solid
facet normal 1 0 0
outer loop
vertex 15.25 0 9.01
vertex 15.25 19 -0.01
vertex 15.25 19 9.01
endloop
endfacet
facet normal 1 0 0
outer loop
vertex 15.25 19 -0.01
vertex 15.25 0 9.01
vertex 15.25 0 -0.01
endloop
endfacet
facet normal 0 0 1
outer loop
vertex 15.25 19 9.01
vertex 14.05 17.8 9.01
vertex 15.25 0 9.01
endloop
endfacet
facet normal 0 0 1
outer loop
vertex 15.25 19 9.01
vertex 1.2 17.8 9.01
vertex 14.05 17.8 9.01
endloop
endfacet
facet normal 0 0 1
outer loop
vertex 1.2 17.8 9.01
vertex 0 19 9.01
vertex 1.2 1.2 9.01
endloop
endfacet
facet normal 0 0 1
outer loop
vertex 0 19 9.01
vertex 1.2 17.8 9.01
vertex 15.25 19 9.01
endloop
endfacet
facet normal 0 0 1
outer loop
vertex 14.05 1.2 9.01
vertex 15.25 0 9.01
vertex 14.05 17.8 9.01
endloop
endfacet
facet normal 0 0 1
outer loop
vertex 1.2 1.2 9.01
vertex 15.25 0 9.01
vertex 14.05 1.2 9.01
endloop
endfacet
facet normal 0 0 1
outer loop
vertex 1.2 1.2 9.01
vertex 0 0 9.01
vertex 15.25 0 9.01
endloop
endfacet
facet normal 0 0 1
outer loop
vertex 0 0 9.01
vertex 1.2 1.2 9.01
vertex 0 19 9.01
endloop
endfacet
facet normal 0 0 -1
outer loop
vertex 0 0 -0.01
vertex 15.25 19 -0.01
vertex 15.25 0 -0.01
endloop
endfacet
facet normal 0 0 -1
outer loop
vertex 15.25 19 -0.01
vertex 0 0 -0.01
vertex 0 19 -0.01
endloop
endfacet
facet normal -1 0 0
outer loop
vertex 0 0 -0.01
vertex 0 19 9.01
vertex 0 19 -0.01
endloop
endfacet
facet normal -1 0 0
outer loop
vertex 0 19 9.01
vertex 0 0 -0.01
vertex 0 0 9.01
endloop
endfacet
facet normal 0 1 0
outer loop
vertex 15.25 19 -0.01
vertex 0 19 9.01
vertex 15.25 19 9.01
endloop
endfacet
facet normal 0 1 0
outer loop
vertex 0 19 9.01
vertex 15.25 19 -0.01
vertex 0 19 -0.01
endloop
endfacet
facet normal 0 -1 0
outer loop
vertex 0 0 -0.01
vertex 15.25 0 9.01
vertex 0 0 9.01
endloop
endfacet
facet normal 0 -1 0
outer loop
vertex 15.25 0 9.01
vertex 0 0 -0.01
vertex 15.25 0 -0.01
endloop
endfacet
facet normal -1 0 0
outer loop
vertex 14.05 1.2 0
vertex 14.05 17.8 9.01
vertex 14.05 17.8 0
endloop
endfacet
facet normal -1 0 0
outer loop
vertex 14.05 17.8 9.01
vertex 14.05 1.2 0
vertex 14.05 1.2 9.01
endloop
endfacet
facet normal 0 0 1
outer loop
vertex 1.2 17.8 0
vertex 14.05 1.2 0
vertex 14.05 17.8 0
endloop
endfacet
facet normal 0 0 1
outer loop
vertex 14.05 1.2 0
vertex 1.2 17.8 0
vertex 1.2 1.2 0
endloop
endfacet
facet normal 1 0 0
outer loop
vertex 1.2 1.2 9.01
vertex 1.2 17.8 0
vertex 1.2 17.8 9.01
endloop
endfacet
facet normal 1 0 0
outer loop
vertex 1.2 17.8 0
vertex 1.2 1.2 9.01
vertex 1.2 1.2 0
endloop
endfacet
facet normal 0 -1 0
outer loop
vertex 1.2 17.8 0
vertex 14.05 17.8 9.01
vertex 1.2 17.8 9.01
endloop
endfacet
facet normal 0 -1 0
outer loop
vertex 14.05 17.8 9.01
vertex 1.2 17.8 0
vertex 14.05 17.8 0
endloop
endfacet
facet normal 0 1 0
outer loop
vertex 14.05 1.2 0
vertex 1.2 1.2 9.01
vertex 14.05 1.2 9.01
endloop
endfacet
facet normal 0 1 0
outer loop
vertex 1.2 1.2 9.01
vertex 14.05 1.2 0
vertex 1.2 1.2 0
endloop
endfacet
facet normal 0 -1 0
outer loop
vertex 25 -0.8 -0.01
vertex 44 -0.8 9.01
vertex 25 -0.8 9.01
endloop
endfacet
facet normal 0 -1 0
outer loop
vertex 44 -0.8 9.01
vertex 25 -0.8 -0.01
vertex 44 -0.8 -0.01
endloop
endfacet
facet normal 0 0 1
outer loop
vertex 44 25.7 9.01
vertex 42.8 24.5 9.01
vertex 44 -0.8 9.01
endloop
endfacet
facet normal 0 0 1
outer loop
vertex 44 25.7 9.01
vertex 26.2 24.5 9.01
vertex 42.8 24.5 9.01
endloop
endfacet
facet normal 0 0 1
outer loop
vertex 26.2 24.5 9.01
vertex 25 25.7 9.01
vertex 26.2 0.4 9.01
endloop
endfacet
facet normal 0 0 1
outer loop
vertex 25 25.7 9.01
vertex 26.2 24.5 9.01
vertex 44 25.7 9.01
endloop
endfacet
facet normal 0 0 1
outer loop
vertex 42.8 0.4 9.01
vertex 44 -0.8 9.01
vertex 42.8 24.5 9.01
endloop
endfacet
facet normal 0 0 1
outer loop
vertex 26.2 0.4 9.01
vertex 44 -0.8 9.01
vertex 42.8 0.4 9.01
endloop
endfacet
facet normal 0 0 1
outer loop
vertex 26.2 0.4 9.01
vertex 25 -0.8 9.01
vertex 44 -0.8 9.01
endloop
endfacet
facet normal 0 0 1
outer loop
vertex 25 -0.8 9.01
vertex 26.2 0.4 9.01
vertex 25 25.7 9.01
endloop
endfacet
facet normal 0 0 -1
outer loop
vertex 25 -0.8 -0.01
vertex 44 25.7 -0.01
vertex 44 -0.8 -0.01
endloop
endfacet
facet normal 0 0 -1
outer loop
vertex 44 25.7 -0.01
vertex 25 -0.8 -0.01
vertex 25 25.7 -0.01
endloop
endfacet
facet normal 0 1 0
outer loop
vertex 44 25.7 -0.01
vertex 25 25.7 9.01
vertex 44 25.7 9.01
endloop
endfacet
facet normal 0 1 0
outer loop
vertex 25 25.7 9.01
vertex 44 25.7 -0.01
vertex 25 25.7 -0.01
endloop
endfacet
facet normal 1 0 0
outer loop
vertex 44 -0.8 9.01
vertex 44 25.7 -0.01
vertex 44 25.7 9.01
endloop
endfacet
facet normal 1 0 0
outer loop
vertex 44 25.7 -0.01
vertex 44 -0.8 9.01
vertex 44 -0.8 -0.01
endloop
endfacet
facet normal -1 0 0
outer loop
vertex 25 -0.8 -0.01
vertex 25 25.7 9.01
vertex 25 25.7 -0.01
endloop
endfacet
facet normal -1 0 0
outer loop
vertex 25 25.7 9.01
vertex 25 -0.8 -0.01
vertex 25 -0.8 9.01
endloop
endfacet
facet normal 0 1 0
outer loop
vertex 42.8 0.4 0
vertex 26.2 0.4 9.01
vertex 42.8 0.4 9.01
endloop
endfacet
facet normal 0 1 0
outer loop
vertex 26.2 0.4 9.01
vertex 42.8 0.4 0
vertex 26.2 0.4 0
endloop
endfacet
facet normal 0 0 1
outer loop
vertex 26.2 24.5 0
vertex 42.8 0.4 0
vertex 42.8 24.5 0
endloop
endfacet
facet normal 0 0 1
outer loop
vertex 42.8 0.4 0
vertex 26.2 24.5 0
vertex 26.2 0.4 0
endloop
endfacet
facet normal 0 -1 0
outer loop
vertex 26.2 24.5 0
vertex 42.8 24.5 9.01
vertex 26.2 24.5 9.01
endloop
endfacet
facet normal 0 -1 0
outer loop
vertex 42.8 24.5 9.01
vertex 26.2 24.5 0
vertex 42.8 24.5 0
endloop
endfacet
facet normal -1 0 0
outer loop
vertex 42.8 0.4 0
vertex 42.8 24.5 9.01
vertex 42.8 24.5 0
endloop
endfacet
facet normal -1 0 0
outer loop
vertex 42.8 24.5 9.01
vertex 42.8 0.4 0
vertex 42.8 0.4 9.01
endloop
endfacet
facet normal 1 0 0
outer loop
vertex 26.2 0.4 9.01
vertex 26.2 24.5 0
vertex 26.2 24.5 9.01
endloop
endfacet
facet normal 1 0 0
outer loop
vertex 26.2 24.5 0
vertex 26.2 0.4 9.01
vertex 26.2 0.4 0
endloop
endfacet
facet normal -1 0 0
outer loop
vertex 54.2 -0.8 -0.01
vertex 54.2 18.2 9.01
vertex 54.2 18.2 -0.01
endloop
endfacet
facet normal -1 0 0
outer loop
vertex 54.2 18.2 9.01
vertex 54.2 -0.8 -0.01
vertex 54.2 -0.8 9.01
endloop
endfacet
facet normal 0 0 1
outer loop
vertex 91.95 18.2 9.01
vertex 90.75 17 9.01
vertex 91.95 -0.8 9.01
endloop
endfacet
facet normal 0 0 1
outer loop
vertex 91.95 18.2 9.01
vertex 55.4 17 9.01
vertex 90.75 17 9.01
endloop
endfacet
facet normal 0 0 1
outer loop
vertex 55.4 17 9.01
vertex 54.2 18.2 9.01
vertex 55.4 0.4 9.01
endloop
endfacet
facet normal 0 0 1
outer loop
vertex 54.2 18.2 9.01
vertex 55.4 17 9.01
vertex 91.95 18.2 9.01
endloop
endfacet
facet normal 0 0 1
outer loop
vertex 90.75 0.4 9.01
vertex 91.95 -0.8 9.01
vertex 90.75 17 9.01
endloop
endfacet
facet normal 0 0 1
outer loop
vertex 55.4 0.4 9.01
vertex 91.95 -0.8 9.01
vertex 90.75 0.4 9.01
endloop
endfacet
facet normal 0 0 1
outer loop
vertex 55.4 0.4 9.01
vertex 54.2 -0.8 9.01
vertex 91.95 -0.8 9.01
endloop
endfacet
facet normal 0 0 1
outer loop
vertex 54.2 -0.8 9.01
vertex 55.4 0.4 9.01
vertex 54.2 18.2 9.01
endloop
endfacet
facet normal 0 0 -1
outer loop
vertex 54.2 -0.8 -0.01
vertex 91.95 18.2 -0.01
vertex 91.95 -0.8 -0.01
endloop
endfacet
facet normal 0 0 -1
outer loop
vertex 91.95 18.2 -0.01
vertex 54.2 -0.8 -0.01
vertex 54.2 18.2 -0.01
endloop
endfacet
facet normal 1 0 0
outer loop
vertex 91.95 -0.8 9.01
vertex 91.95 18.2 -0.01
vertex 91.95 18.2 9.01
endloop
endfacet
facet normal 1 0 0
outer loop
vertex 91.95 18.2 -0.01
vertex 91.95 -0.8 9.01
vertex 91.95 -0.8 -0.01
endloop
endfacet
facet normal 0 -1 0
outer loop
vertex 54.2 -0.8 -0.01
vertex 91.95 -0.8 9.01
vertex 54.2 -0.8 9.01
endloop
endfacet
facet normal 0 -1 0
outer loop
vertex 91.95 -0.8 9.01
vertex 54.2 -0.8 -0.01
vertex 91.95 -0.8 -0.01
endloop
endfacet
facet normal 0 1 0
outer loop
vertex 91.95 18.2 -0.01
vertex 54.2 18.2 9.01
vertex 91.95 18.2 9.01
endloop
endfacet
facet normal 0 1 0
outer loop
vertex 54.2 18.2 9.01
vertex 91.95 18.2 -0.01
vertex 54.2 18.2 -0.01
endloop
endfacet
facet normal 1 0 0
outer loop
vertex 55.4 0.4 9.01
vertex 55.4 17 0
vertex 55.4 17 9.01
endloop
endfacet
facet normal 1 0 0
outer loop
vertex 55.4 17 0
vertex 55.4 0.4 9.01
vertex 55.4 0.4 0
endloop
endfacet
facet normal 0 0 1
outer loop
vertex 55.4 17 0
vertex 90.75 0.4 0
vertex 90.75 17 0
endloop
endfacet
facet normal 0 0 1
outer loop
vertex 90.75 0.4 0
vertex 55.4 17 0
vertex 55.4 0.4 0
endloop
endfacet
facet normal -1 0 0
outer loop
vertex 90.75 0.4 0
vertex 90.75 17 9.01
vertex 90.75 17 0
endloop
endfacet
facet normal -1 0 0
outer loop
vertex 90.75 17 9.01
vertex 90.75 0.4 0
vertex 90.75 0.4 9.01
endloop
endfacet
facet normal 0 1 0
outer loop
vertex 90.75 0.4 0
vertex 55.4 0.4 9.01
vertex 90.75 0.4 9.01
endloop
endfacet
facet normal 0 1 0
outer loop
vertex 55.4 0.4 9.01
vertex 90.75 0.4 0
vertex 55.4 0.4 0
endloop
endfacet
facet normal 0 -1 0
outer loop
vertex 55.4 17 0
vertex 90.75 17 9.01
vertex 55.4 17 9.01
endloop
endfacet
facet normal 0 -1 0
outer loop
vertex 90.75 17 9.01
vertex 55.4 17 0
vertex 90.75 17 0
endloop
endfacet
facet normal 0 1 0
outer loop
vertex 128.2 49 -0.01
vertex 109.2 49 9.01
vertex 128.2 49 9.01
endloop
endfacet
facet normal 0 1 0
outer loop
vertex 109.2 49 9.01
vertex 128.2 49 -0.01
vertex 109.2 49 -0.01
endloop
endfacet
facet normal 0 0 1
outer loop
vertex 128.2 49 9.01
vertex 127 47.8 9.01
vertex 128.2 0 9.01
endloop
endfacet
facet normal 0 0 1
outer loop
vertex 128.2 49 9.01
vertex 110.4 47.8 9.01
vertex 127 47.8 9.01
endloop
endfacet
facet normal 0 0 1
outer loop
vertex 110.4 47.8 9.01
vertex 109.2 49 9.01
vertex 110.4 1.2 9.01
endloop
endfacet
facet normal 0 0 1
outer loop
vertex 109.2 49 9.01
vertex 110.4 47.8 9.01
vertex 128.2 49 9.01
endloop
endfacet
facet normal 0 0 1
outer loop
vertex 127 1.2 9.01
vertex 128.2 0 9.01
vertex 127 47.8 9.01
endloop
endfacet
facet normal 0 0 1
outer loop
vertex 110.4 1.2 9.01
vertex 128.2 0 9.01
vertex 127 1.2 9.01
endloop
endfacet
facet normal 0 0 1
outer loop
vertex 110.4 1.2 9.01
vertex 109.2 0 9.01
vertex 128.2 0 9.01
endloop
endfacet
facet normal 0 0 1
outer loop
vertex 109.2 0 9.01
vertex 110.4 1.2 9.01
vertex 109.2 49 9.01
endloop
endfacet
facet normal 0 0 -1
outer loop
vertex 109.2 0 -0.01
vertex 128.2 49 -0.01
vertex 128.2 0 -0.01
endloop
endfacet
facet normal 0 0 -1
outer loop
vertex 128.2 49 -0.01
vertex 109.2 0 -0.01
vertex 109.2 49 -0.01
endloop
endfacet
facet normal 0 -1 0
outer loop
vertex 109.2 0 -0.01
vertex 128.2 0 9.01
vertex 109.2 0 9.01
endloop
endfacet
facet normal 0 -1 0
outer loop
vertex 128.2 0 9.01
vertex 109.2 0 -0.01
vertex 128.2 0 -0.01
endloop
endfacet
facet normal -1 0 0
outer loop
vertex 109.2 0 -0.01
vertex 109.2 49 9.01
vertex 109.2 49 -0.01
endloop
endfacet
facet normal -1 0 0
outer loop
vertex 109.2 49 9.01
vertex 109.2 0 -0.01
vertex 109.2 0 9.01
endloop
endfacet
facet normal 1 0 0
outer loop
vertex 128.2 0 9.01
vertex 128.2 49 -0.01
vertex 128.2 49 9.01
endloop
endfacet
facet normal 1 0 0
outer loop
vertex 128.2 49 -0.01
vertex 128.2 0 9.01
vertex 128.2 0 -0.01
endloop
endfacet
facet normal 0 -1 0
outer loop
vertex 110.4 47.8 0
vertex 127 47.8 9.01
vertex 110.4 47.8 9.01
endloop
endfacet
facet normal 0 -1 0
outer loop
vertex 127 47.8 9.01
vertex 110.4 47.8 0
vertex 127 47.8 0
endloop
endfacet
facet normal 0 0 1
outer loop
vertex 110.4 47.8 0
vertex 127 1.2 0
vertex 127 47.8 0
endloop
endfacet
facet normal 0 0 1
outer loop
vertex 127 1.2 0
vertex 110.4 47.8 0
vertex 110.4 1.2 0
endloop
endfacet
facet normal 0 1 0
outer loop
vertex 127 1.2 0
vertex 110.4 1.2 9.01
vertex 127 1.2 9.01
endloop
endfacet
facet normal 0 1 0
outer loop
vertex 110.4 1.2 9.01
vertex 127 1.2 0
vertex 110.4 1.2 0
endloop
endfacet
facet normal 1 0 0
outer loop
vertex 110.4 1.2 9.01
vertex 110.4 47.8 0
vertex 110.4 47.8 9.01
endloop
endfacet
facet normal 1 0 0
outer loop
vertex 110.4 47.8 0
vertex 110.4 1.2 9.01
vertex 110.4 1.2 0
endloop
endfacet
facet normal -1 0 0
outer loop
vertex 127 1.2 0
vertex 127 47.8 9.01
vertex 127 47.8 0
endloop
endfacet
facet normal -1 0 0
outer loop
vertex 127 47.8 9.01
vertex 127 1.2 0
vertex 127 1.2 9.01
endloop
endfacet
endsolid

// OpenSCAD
// file: ../../Base/Boxes.scad
// Fischertechnik Box Foundation
// Pre-designed Boxes

use <Constants.scad>

include <PlacementOptions.scad>

box190Width = 190;
box190Depth = 130;
box130Width = 130;
box130Depth = 95;
boxUsageHeight = 33.9;
boxWallThickness = 2.4;
boxBaseThickness = 1.0;

// getBoxWallThickness()
// Gets the wall thickness of a Fischertechnik Box

function getBoxWallThickness() = boxWallThickness;

// Gets the usable height of a fischertechnik box
function getBoxUsageHeight() = boxUsageHeight;

// Gets the thickness of the Fischertechnik box base.
function getBoxBaseThickness() = boxBaseThickness;

// Gets the usable inner space of a Box 190 as an x/y-list
function getBox190Space() = [
    box190Width - 2*getBoxWallThickness(), 
    box190Depth - 2*getBoxWallThickness() ];

// Imports the Fischertechnik empty box 130x190 mm and places it at position 0,0
// 190x130 are the outer sizes, the inner space is slightly smaller. Use getBox190Space() to get the inner sizes.
// This module needs the STL file "Fischertechnik Box 130x190.stl" in the library path.
// The box is positioned that the usable inner space is at the 0,0,0 position. The

module Box190() {
    translate([-getBoxWallThickness(),-getBoxWallThickness(),-getBoxBaseThickness()])
        import("Fischertechnik Box 130x190.stl", convexity=3);
}

// Gets the usable inner space of a Box 130 as an x/y-list
function getBox130Space() = [
    box130Width - 2*getBoxWallThickness(), 
    box130Depth - 2*getBoxWallThickness() ];

// Imports the Fischertechnik empty box 95x130 mm and places it at position 0,0
// 190x130 are the outer sizes, the inner space is slightly smaller. Use getBox190Space() to get the inner sizes.
// This module needs the STL file "Fischertechnik Box 95x130.stl" in the library path.
// The box is positioned that the usable inner space is at the 0,0,0 position. The

module Box130() {
    translate([-getBoxWallThickness(),-getBoxWallThickness(),-getBoxBaseThickness()])
        import("Fischertechnik Box 95x130.stl", convexity=3);
}

// Creates a web at the specified box walls
// corner 0 = LowerLeft, 1 = UpperLeft, 2 = UpperRight, 3 = LowerRight
// side 0 = LeftOfCorner, 1 = RightOfCorner
// distance = Distance in mm from the corner
// box = inner width and depth of the box (default: Box 190)
// webWidth = length of the web (default is 3 mms)
// webThickness = thickness of the web (default is 1 mm)

module BoxWeb(corner, side, distance, box=getBox190Space(), webWidth=3, webThickness=1.0) {
    sink = getBoxWallThickness()/2;

    width = (corner % 2 == 0) ? 
            (side == LeftOfCorner ? webWidth : webThickness) :
            (side == LeftOfCorner ? webThickness : webWidth);

    depth = (corner % 2 == 0) ? 
            (side == RightOfCorner ? webWidth : webThickness) :
            (side == RightOfCorner ? webThickness : webWidth);
    
    xDiff = corner == LowerLeft ? 
                (side == LeftOfCorner ? -sink : distance) :
            (corner == UpperLeft ?                
                (side == LeftOfCorner ? distance : -sink) :
            (corner == UpperRight ?
                (side == LeftOfCorner ? box.x-webWidth+sink : box.x-distance-webThickness) :
                (side == LeftOfCorner ? box.x-distance-webThickness: box.x-webWidth+sink)));

    yDiff = corner == LowerLeft ? 
                (side == RightOfCorner ? -sink : distance) :
            (corner == UpperLeft ?
                (side == RightOfCorner ? box.y-distance : box.y-webWidth+sink) :
            (corner == UpperRight ?
                (side == RightOfCorner ? box.y-webWidth+sink : box.y-distance) :
                (side == RightOfCorner ? distance : -sink)));
    
    translate([xDiff, yDiff, -getExcess()])
        cube([width, depth, boxUsageHeight + 2*getExcess()]);
}
// file: ../../Base/Rotation.scad
// Fischertechnik Box Foundation
// Geometry Helpers Rotation

include <PlacementOptions.scad>

// getRotatedSpace(space, rotation=NoRotation)
// Rotates the space dependent on the specified rotation

function getRotatedSpace(space, rotation=NoRotation) = [
    (rotation == Rotate90 || rotation == Rotate270) ? space.y : space.x,
    (rotation == Rotate90 || rotation == Rotate270) ? space.x : space.y
];

// Rotates the given space around the fixed left lower corner
// space = the space the children needs as width/depth list [width,depth]
// rotation = 0 Rotate0 degrees, 1 Rotate90 degrees, 2 Rotate180 degrees, 3 Rotate270 degrees (equivalent to -90)

module RotateFix(space, rotation=Rotate0) {
    dy = (rotation == Rotate0 || rotation == Rotate270) ? 0 :
        (rotation == Rotate90) ? space.x :
        space.y;
    dx = (rotation < Rotate180) ? 0 :
        (rotation == Rotate180) ? space.x :
        space.y;
    
    translate([dx, dy, 0])
        rotate([0, 0, rotations[rotation]])
            children();
}
// file: ../../Base/Alignment.scad
// Fischertechnik Box Foundation
// Geometry Helpers Alignment

include <PlacementOptions.scad>

// getAlignedX(elementWidth, spaceWidth, align=AlignRight, offset=0)
// Gets the aligned X offset of an element with the given
// width in the given space.
// elementWidth = The width of the element to positon
// spaceWidth = The space where the element should be aligned
// align = 0 AlignLeft, 1 AlignCenter, 2 AlignRight
// offset = an optional offset from the aligned position. When
// aligned left or centered, then positive values are in X direction.
// When aligned right then positive values are in negative X direction.

function getAlignedX(elementWidth, spaceWidth, align=AlignRight, offset=0) =
    (align == AlignLeft) ?
        offset :
        ((align == AlignCenter) ?
        (spaceWidth - elementWidth)/2 + offset :
        spaceWidth - offset - elementWidth);

// getAlignedY(elementDepth, spaceDepth, align=AlignTop, offset=0)
// Gets the aligned Y offset of an element with the given
// depth in the given space.
// elementDepth = The depth of the element to positon
// spaceDepth = The space where the element should be aligned
// align = 0 AlignBottom, 1 AlignCenter, 2 AlignTop
// offset = an optional offset from the aligned position. When
// aligned bottom or centered, then positive values are in Y direction.
// When aligned top then positive values are in negative Y direction.

function getAlignedY(elementDepth, spaceDepth, align=AlignTop, offset=0) =
    (align == AlignBottom) ?
        offset :
        ((align == AlignCenter) ?
        (spaceDepth - elementDepth)/2 + offset :
        spaceDepth - offset - elementDepth);
// file: ../../Base/Constants.scad
// Fischertechnik Box Foundation
// Constants

// Constant values necessary for multiple elements

// Base constants
dividerThickness = 1.2;
excess = 0.01;
fragments = 90;
tolerance = 0.8;

// Gets the thickness of a divider 
function getDividerThickness() = dividerThickness;

// Gets the excess that is used to merge walls into each other
function getExcess() = excess;

// Gets amount of fragments of a cylinder
function getFragments() = fragments;

// Gets the inner tolerance of a frame to each side
function getTolerance() = tolerance;


// Fischertechnik specific constants
axisDiameter = 4;
axisBottomDiameter = axisDiameter + 1;
standardEdgeDistance = 2.5;
standardWebDistance = 11.5;
standardCornerLength = 15;
tubeWallFactor = 1.6;

// Gets axis diameter
function getAxisDiameter() = axisDiameter;

// Gets axis bottom diameter for thicker part at the bottom
function getAxisBottomDiameter() = axisBottomDiameter;

// gets the standard distance to the wall of the box for dockable frames with webs
function getStandardEdgeDistance() = standardEdgeDistance;

// gets the standard distance of each web to the corner of the dockable frame
function getStandardWebDistance() = standardWebDistance;

// gets the standard length of the corner walls of a dockable frame
function getStandardCornerLength() = standardCornerLength;

// gets the wall thickness of a tube.
function getTubeWallThickness() = tubeWallFactor * getDividerThickness();
// file: ../../Base/PlacementOptions.scad
// Fischertechnik Box Foundation
// Placement Options

// Alignment
NoAlign = 0;
AlignLeft = 1;
AlignBottom = 2;
AlignCenter = 3;
AlignRight = 4;
AlignTop = 5;

// Element rotation degree steps
rotations = [0, -90, -180, -270];

// Rotation
NoRotation = 0;
Rotate0 = 0;
Rotate90 = 1;
Rotate180 = 2;
Rotate270 = 3;

// Docking (seen from above)
NoDock = -1;
DockLeft = 0;
DockTop = 1;
DockRight = 2;
DockCorner = 2;
DockBottom = 3;

// Web corners
LowerLeft = 0;
UpperLeft = 1;
UpperRight = 2;
LowerRight = 3;

// Web position relative to corner
LeftOfCorner = 0;
RightOfCorner = 1;
// file: ../../Elements/FrameAngleIsosceles.scad
// Fischertechnik Box Library
// Frame for isosceles angle blocks
// 31011

use <../Base/Constants.scad>
use <../ModelBase/Simple.scad>

width = 45 / 4;
depth = 15;
height = 9;

// getFrameAngleEquilateralSpace
// Gets the space the frame angle equilateral needs for count blocks as width and depth (.x and .y as a list)
// count = Count of equilateral angle blocks

function getFrameAngleIsoscelesSpace(count=1) = getFrameOuterVolume([width * count, depth, height]);
/*[
    frameGridWidth * count + 2 * getWallThickness() + getTolerance(), 
    frameGridDepth + 2 * getWallThickness() + getFrameInnerGap()];*/

// FrameAngleIsosceles(count)
// count = Count of angle blocks in x direction
// The walls of the frame are 9 mm high.
// The complete frame has a tolerance of addition 1 mm in each direction.

module FrameAngleIsosceles(count=1) {
    innerVolume = getFrameInnerVolume([width * count, depth, height]);
    Frame(innerVolume);
}

// Tests
color ("lightgray")
FrameAngleIsosceles(2);
// file: ../../Base/Placement.scad
// Fischertechnik Box Foundation
// Geometry Helpers Placement

use <Constants.scad>
use <Alignment.scad>
use <Rotation.scad>
use <Boxes.scad>

include <PlacementOptions.scad>

// Place(x=0, y=0, elementSpace=[0,0], alignX=AlignLeft, alignY=AlignBottom, rotation=Rotate0, boxSpace=getBox190Space())
// Places the child at the specified position
// y = Y-Position. This is a relative position when an X aligment is specified.
// x = X-Position. This is a relative position when an Y aligment is specified.
// elementSpace = space of the element to be placed [x,y]
// alignX = -1=NoAlign, 0 AlignLeft, 1 AlignCenter, 3 AlignRight (elementSpace and boxSpace required!)
// alignY = -1=NoAlign, 2 AlignBottom, 1 AlignCenter, 4 AlignTop (elementSpace and boxSpace required!)
// rotation = 0 Rotate0 0 degrees, 1 Rotate90 90 degrees, 
// 2 Rotate180 180 degrees, 3 Rotate270 270 degrees (equivalent to -90)
// boxSpace = Inner space of the box where the placement occurs [x,y] - default is Box 190x130 inner space

module Place(x=0, y=0, elementSpace=[0,0], 
  alignX=AlignLeft, alignY=AlignBottom, 
  rotation=NoRotation, boxSpace=getBox190Space()) {

    module Position(x, y, space, rotation=Rotate0) {
        translate([x, y, 0])
            RotateFix(space, rotation)
                children(0);
    }

    space = getRotatedSpace(elementSpace, rotation);
    alignedX = getAlignedX(space.x, boxSpace.x, alignX, x);
    alignedY = getAlignedY(space.y, boxSpace.y, alignY, y);
    Position(alignedX, alignedY, elementSpace, rotation)
        children(0);
}

// Center(space=getBox130Space(), elementSpace=[0,0])
// space = Space where the children is centered. For cylinder use centered=true and no elementSpace.
// elementSpace = space of the element to be centered [x,y]

module Center(space=getBox190Space(), elementSpace=[0,0]) {
    translate([(space.x - elementSpace.x) / 2, (space.y - elementSpace.y) / 2])
        children(0);
}

// CenterHorizontal(width=0, y=0, offset=0, space=getBox130Space())
// space = Space where the children is centered. For cylinder use centered=true and no elementSpace.
// elementSpace = space of the element to be centered [x,y]

module CenterHorizontal(width=0, y=0, offset=0, space=getBox190Space()) {
    translate([(space.x - width) / 2 + offset, y])
        children(0);
}

// CenterVertical(depth=0, x=0, offset=0, space=getBox130Space())
// space = Space where the children is centered. For cylinder use centered=true and no elementSpace.
// elementSpace = space of the element to be centered [x,y]

module CenterVerticalal(depth=0, x=0, offset=0, space=getBox190Space()) {
    translate([x, (space.y - depth) / 2 + offset])
        children(0);
}
// main file
// Fischertechnik Box Foundation
// Elements
// Test FrameAngleIsosceles

use <../../Base/Placement.scad>
use <../../Elements/FrameAngleIsosceles.scad>

include <../../Base/PlacementOptions.scad>

FrameAngleIsosceles();

Place(25, 0, elementSpace=getFrameAngleIsoscelesSpace(2), rotation=Rotate90)
    FrameAngleIsosceles(2);
    
Place(55, 0, elementSpace=getFrameAngleIsoscelesSpace(3), rotation=Rotate180)
    FrameAngleIsosceles(3);
    
Place(110, 0, elementSpace=getFrameAngleIsoscelesSpace(4), rotation=Rotate270)
    FrameAngleIsosceles(4);
